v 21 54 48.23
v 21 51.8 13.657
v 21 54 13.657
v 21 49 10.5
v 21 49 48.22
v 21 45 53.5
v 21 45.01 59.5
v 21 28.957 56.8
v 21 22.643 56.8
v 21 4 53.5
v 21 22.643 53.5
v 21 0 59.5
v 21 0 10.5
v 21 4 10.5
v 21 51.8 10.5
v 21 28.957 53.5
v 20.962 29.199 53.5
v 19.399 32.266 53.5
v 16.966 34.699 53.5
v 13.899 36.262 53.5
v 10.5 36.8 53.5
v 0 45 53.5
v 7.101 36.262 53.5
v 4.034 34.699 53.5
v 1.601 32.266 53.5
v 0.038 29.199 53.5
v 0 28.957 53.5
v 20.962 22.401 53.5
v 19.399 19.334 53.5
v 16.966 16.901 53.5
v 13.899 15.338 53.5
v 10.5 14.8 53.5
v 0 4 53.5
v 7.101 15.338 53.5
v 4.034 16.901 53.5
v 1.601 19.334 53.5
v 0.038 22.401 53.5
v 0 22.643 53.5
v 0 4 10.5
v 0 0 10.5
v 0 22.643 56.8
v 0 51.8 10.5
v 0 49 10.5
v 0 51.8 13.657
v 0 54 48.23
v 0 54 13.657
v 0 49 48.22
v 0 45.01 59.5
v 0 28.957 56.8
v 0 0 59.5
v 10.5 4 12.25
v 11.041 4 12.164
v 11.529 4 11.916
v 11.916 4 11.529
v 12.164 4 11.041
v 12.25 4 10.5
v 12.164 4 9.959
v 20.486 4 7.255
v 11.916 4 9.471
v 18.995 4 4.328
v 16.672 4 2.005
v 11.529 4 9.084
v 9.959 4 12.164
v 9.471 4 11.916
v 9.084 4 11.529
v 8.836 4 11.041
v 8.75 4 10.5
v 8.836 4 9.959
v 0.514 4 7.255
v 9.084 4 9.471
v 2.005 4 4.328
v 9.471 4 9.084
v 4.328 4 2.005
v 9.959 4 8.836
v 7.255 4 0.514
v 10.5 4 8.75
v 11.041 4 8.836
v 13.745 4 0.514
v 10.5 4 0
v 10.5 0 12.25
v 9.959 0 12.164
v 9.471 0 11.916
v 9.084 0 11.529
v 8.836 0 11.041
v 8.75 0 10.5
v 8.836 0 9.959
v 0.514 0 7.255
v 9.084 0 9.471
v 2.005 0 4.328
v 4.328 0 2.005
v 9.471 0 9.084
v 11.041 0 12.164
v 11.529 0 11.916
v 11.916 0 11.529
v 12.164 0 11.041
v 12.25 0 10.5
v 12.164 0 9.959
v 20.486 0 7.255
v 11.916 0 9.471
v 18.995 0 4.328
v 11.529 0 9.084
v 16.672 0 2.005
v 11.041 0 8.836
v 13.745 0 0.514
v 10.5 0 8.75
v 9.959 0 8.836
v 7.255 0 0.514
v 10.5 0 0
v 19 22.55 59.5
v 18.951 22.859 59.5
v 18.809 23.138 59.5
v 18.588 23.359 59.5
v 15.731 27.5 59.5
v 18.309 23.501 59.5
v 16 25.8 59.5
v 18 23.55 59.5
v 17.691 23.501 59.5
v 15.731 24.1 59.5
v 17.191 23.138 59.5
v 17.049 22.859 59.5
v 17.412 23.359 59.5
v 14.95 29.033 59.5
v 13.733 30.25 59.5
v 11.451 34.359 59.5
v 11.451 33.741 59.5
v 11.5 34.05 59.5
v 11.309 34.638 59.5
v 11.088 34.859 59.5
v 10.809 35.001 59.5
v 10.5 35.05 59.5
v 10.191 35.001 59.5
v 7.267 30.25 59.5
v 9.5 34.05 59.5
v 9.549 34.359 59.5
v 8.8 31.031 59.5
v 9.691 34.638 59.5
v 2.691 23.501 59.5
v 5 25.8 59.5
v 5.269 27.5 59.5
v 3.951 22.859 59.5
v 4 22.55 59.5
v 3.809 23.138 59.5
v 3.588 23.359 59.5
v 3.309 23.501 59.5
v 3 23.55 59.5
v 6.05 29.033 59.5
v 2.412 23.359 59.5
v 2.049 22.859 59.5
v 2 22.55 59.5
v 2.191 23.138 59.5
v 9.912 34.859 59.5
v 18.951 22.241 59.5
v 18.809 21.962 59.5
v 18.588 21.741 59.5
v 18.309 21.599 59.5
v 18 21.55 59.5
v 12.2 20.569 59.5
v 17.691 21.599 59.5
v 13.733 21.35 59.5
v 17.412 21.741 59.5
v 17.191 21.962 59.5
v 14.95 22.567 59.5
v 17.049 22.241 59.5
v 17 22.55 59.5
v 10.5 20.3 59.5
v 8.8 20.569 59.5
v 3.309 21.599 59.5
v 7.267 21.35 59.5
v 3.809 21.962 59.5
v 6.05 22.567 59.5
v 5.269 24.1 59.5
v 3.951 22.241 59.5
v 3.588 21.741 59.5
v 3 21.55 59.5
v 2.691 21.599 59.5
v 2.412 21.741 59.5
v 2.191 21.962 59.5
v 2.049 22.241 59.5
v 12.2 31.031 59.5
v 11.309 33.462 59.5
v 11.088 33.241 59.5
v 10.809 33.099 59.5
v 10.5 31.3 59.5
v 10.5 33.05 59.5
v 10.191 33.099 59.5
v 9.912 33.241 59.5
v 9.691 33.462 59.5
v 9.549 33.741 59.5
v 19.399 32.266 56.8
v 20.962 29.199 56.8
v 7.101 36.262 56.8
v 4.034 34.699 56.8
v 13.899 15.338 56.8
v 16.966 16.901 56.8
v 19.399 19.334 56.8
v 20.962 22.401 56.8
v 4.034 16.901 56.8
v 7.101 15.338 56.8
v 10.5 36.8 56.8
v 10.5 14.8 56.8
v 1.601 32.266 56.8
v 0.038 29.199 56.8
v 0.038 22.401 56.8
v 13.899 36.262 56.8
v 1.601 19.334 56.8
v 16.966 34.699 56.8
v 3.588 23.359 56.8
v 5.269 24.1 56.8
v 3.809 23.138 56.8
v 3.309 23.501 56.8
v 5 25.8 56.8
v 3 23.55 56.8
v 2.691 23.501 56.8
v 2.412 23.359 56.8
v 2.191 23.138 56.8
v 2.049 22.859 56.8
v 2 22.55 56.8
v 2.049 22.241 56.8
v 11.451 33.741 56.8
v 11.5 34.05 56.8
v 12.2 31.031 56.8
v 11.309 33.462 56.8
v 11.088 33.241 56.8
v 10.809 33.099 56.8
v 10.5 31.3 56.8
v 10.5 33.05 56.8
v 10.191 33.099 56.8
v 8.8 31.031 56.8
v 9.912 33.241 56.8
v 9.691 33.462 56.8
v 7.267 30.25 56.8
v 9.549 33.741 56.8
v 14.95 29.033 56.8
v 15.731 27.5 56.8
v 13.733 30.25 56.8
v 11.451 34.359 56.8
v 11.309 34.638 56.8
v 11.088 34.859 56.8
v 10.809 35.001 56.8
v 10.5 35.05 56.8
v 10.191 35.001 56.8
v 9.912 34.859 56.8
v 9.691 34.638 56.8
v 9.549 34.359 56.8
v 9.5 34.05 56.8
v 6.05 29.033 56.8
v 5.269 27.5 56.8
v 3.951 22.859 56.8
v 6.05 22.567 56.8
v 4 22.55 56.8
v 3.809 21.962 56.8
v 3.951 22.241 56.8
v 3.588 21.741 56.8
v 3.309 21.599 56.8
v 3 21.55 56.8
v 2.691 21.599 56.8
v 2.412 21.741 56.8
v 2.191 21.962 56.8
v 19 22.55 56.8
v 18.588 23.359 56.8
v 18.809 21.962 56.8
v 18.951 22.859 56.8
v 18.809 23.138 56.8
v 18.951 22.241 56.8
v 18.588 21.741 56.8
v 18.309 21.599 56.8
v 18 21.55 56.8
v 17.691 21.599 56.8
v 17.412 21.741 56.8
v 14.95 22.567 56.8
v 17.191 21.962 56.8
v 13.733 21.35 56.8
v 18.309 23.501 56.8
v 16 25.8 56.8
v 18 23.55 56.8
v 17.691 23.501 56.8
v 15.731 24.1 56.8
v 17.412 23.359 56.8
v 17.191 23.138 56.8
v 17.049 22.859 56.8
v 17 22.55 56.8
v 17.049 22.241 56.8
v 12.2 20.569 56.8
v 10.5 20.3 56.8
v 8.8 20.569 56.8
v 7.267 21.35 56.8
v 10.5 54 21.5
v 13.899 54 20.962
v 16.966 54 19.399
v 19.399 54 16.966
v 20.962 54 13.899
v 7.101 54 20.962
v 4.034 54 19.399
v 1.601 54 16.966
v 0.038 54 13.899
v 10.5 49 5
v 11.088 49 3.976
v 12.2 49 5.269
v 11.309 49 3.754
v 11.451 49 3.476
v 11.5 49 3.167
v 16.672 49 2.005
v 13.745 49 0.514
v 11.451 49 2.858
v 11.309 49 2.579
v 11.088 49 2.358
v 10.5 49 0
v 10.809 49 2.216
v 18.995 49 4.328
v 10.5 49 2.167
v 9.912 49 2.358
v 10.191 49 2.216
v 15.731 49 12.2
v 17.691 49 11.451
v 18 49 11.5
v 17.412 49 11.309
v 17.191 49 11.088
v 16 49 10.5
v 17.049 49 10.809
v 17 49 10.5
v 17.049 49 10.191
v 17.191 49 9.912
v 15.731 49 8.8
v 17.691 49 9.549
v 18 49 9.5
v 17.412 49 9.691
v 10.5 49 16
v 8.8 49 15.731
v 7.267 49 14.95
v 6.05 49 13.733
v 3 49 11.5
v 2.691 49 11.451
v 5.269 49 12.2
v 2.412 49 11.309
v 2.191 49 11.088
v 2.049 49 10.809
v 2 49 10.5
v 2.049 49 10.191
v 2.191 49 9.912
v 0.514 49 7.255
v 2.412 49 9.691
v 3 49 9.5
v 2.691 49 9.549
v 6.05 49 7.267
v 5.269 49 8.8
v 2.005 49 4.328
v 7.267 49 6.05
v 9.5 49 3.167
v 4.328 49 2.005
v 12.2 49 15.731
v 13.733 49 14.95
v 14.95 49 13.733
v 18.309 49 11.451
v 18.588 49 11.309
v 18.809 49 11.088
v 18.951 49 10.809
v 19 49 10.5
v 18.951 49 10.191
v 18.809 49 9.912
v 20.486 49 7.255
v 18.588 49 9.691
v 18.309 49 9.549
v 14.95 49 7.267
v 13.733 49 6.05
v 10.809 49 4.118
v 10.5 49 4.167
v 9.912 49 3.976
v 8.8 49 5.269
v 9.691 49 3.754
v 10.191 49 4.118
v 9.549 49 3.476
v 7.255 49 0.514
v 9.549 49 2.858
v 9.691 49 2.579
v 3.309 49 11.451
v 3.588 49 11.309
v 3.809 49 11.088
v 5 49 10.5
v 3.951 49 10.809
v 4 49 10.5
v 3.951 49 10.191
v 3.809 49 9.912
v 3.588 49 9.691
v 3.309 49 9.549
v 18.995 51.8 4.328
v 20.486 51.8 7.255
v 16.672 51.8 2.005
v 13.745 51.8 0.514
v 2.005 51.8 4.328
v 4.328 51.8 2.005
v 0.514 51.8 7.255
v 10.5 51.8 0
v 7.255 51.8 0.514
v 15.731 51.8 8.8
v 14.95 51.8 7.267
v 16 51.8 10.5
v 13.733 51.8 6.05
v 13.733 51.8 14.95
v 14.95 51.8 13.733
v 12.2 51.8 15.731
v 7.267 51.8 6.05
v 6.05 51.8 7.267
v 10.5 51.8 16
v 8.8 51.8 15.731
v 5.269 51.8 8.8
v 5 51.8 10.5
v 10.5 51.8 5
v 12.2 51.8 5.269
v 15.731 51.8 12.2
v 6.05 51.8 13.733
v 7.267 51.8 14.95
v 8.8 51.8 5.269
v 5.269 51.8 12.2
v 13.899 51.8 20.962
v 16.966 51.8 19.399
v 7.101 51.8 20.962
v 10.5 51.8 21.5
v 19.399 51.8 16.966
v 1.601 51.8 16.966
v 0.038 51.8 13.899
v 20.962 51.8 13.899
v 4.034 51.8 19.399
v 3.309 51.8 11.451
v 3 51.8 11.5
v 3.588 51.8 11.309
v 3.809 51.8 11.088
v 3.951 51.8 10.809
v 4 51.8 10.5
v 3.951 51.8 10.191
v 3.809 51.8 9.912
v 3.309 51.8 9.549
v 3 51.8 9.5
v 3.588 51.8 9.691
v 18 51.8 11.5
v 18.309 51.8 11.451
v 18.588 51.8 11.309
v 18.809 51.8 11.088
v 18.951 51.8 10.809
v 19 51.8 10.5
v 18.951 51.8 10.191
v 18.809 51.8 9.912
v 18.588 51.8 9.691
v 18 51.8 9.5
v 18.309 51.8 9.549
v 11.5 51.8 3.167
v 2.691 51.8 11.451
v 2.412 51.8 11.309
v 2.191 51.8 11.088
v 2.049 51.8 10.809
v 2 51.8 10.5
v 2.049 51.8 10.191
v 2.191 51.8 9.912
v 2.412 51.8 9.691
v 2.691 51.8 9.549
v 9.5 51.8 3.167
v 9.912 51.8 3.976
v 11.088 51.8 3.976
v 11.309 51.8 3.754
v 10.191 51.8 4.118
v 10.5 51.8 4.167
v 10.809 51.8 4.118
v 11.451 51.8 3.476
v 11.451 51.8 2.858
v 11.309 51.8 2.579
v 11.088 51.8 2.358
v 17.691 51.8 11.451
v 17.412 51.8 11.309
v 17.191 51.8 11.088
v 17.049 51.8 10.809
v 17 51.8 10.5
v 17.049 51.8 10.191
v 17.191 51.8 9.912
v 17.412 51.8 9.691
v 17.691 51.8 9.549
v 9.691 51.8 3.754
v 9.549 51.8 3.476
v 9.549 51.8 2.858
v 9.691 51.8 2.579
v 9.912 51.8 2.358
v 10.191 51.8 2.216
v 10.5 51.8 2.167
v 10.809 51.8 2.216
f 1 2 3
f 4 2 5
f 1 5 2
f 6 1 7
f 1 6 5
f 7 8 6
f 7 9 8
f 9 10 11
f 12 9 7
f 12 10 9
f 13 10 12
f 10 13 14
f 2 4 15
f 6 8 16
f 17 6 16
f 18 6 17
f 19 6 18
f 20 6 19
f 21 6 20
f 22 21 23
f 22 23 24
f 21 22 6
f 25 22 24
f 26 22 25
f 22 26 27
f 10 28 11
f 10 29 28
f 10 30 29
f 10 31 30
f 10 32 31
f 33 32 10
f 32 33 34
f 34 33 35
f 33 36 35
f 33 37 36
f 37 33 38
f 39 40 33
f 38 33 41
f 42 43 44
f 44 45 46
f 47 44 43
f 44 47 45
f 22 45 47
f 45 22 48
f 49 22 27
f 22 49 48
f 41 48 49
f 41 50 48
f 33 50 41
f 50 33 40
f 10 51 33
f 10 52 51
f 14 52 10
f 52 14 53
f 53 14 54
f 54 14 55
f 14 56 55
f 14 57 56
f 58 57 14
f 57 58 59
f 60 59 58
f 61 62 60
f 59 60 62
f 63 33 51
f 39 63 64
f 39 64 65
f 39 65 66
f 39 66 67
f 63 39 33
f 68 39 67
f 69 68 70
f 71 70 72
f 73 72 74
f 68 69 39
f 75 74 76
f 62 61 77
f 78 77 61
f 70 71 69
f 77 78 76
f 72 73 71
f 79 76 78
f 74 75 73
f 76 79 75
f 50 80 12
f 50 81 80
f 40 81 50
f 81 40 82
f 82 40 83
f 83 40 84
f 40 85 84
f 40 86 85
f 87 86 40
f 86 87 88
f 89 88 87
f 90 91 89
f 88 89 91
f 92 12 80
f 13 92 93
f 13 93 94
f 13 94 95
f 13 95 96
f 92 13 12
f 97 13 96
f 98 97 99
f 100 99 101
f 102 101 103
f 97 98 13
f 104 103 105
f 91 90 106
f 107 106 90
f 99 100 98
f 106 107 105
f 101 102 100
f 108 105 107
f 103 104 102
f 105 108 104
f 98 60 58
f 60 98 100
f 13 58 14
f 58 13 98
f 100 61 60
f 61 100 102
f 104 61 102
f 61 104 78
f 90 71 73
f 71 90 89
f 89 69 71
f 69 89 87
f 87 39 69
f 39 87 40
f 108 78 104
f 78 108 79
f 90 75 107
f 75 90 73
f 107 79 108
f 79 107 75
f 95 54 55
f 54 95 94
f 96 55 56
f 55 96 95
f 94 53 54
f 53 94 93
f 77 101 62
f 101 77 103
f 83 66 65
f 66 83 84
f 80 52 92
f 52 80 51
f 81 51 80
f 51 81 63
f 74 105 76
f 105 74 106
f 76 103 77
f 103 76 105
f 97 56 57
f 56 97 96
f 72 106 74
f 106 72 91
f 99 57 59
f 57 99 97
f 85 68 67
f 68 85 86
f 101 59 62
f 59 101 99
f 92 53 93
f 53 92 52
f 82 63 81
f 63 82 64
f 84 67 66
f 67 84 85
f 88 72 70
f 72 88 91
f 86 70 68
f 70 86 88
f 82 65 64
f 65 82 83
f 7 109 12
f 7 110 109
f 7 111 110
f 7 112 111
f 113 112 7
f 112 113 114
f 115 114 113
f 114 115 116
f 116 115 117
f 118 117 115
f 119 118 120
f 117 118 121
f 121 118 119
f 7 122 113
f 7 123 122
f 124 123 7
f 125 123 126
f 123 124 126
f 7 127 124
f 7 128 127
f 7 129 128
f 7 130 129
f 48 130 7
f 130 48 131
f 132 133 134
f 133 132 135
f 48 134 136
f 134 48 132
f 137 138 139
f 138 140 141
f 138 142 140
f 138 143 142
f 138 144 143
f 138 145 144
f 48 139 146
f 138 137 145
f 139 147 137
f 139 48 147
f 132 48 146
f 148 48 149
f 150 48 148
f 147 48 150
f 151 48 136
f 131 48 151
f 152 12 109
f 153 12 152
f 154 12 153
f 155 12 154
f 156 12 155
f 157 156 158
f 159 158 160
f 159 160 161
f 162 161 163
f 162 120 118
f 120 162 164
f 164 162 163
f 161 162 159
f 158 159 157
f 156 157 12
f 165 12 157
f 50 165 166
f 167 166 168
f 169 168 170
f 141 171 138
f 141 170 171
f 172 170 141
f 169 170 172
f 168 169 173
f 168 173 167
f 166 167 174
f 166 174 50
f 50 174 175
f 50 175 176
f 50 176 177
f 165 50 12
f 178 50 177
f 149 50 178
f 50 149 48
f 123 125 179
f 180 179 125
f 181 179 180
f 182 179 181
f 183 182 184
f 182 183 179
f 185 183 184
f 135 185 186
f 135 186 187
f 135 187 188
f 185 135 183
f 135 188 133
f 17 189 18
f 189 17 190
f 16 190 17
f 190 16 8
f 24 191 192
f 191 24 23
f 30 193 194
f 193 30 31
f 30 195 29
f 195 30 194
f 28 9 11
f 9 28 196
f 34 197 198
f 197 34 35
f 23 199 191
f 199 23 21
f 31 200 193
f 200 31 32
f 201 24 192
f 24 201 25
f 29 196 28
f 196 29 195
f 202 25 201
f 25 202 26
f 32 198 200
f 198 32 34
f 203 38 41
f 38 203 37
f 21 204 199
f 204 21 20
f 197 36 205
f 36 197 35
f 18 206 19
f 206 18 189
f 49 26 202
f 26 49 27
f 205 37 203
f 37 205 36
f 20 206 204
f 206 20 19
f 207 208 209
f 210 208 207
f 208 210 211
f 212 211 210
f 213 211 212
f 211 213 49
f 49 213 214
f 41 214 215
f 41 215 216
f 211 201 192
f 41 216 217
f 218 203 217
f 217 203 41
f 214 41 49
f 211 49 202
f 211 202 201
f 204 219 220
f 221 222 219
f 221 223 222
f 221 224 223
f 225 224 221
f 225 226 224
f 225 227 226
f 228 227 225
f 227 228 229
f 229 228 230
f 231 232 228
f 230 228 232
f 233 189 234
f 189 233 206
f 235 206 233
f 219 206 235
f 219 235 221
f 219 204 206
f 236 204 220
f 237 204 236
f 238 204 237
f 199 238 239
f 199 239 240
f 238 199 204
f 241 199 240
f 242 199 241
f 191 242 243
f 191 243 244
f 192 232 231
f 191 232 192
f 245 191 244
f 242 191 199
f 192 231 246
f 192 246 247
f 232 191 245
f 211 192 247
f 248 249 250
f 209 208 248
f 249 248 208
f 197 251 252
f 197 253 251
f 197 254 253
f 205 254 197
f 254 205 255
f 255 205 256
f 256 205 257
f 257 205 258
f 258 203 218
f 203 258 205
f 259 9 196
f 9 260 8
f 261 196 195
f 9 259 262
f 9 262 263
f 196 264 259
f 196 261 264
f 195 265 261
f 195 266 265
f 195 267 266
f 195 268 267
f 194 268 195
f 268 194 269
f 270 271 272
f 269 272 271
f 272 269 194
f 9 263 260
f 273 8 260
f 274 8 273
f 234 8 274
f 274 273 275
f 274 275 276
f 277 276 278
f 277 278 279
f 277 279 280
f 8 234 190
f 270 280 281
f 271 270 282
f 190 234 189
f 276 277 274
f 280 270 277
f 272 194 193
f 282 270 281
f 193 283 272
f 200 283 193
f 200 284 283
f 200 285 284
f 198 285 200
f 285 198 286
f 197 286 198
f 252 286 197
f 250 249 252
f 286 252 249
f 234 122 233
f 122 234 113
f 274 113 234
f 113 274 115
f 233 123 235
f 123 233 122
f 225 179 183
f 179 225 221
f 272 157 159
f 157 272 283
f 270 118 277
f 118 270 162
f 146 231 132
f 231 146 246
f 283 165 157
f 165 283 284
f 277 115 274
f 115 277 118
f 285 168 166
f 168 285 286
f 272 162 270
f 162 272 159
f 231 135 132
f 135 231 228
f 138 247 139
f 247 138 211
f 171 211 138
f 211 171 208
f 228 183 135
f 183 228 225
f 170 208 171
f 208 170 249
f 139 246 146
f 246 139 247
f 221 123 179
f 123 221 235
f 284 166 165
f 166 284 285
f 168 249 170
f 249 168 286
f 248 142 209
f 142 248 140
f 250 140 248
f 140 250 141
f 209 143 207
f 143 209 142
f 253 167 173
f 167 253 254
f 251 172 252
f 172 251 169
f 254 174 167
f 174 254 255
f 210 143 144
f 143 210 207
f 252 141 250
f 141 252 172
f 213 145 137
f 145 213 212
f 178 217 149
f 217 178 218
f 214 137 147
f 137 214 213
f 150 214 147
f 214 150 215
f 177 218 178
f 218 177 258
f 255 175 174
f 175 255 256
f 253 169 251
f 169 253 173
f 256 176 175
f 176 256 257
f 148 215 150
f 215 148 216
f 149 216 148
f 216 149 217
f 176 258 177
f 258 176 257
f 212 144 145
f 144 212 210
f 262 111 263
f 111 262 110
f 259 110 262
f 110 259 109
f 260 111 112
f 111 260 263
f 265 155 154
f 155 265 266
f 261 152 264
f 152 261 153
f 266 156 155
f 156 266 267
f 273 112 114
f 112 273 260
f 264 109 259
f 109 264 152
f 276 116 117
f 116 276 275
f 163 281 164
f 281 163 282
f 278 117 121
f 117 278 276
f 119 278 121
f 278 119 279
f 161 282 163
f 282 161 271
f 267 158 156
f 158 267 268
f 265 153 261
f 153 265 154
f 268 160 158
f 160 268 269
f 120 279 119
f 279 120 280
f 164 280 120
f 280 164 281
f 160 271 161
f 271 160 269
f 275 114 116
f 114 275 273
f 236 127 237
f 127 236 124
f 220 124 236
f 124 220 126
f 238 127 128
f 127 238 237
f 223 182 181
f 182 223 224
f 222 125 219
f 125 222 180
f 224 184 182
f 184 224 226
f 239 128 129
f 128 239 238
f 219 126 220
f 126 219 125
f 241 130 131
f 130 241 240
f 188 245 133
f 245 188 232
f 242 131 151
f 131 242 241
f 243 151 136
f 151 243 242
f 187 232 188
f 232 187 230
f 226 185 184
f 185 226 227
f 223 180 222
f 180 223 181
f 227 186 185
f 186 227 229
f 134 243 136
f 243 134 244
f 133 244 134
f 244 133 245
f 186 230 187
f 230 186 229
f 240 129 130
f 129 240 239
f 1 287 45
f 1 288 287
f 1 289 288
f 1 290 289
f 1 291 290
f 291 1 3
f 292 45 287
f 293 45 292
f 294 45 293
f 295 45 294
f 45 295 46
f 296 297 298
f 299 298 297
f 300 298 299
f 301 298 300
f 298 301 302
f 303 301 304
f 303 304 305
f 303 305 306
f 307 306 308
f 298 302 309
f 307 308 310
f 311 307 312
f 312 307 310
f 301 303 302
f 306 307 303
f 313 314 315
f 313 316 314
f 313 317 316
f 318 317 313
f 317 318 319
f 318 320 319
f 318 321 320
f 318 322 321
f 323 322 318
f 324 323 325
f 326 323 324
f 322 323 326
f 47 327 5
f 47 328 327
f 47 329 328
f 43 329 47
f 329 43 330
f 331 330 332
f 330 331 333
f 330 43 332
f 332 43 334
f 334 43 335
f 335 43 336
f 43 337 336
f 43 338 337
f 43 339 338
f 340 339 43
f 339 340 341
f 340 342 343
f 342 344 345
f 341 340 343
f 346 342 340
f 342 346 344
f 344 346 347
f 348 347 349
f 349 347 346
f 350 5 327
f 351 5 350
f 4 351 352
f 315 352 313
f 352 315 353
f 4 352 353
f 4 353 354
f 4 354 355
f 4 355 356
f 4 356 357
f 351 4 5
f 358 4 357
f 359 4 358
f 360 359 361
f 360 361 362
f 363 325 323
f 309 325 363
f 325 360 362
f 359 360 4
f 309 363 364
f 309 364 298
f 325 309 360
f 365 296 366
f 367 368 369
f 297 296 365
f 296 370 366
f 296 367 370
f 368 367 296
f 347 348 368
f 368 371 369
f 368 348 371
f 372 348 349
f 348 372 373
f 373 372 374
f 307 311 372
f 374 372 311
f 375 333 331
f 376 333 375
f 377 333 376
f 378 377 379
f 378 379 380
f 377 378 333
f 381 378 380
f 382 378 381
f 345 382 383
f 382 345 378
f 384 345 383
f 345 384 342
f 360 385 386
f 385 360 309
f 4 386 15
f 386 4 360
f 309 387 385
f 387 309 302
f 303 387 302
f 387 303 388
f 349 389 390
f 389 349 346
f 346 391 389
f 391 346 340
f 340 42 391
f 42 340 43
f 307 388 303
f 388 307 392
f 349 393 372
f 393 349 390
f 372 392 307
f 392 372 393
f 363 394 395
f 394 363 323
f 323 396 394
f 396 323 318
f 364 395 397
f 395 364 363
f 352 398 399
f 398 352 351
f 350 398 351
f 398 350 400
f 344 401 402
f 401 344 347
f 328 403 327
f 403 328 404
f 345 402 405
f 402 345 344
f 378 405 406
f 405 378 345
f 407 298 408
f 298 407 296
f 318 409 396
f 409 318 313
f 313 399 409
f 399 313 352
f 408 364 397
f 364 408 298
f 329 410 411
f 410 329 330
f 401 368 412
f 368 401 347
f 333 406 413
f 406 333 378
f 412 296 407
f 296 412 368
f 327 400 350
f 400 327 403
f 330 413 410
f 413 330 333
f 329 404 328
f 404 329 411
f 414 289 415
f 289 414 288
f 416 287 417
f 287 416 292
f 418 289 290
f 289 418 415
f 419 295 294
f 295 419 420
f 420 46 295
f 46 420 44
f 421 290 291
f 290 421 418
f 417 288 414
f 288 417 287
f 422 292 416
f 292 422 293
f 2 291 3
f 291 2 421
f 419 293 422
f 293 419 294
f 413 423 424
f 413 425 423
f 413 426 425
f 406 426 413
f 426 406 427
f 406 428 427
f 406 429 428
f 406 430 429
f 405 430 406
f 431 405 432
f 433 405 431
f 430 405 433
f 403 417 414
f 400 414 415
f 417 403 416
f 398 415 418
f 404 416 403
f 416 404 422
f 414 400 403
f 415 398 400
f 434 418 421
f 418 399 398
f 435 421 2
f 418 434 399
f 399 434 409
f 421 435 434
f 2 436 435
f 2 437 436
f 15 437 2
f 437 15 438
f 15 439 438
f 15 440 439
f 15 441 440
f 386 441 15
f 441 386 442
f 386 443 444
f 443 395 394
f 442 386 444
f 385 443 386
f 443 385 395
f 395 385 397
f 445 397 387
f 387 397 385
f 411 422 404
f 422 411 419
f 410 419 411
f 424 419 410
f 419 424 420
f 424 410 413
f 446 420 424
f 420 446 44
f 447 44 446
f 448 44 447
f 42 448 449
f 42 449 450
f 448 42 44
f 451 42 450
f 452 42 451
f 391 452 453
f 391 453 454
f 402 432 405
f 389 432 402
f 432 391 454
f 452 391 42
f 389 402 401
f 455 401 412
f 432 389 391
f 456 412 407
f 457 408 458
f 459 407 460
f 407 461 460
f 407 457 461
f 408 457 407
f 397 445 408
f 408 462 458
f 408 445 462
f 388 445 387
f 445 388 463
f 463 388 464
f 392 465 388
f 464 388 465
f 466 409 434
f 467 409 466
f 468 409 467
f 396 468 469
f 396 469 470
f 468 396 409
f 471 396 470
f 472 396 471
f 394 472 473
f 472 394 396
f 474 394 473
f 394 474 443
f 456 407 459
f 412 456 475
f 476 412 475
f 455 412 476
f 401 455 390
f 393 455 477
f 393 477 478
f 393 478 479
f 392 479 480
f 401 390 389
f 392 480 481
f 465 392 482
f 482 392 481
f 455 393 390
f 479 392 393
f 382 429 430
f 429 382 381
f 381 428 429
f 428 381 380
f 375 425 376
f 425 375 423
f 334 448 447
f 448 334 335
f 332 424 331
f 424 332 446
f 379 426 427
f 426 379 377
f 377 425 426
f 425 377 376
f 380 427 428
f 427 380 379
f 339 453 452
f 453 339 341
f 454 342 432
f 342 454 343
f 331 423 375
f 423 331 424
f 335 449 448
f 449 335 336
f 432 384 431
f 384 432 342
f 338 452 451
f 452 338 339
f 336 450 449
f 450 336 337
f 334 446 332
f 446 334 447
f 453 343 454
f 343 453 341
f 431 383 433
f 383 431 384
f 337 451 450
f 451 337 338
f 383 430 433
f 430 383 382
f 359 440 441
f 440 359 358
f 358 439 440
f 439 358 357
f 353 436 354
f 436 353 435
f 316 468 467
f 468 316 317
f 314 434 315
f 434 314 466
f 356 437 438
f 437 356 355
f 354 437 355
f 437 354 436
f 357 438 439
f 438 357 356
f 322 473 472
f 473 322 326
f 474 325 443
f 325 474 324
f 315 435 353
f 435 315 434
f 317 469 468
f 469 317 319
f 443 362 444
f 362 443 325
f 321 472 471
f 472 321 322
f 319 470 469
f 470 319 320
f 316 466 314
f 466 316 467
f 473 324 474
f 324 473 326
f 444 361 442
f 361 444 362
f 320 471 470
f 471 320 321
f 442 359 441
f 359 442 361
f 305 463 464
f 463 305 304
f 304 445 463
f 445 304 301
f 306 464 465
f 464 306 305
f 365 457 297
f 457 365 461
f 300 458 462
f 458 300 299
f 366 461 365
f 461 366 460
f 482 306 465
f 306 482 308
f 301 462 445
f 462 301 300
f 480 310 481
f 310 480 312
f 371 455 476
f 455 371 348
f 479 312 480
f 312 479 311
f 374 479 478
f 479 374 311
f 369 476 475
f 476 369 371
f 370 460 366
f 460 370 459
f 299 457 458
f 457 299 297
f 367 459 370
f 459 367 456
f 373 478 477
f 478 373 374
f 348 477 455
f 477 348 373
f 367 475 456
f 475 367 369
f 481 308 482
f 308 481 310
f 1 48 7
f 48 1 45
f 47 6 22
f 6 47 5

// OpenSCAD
//leg

//variables
xUpper = 21;
yUpper = 45;
zUpper = 6;

upperBigHoleD = 22;
upperBigHoleH = 3.3;

upperMediumHoleD = 11;
upperSmallHoleD = 2;

xLeftSide = 21;
yLeftSide = 4;
zLeftSide = 43;

xRightSide = 21;
yRightSide = 5;
zRightSide = 37.72;

leftSideHoleD = 3.5;
cornerLeftD = xLeftSide;

//modules
module leg(){
    union(){
        leftPart();
        thingsToHull();
        upperPart();
        rightPart();
    }
}

module thingsToHull(){
    hull(){
    translate([0,yUpper,zLeftSide+cornerLeftD/2])
        cube([xUpper, 0.01, zUpper]);
    translate([0,yUpper+9-yRightSide,cornerLeftD/2+zRightSide])
        cube([xRightSide, yRightSide, 0.01]);
    }
}

module upperPart(){
    difference(){
        //Parte plana superior
        translate([0,0,zLeftSide+cornerLeftD/2])
            cube([xUpper, yUpper, zUpper]);
        //circulo grande
        translate([xUpper/2, 10.8+yLeftSide+upperBigHoleD/2,zLeftSide+cornerLeftD/2+upperBigHoleH/2])
            cylinder(h=upperBigHoleH, d=upperBigHoleD, center=true, $fn=20);
        //circulo mediano
        translate([xUpper/2, 10.8+yLeftSide+upperBigHoleD/2,zLeftSide+cornerLeftD/2+zUpper/2])
            cylinder(h=zUpper, d=upperMediumHoleD, center=true, $fn=20);
        
        //circulos pequeños
        translate([3, 10.8+yLeftSide+upperBigHoleD/2-3.25,zLeftSide+cornerLeftD/2+zUpper/2])
            cylinder(h=zUpper, d=upperSmallHoleD, center=true, $fn=20);
        translate([xUpper-3, 10.8+yLeftSide+upperBigHoleD/2-3.25,zLeftSide+cornerLeftD/2+zUpper/2])
            cylinder(h=zUpper, d=upperSmallHoleD, center=true, $fn=20);
        translate([xUpper/2, 10.8+yLeftSide+upperBigHoleD/2+upperMediumHoleD/2+(upperBigHoleD-upperMediumHoleD)/4,zLeftSide+cornerLeftD/2+zUpper/2])
            cylinder(h=zUpper, d=upperSmallHoleD, center=true, $fn=20);
    }    
}

module leftPart(){
    difference(){
        leftPartWithoutHole();
        translate([cornerLeftD/2,yLeftSide/2,cornerLeftD/2])
            rotate([90,0,0])
                cylinder(h=yLeftSide+1, d=leftSideHoleD, center=true, $fn=20);
    }
}

module leftPartWithoutHole(){
    union(){
        translate([0,0, cornerLeftD/2])
            cube([xLeftSide, yLeftSide, zLeftSide]);
        translate([cornerLeftD/2,0,cornerLeftD/2])
            rotate([270,0,0])
                cylinder(h=yLeftSide, d=cornerLeftD, $fn=20);
    }    
}

module rightPart(){
    difference(){
        union(){
            translate([0,yUpper+9-yRightSide,cornerLeftD/2])
                cube([xRightSide, yRightSide, zRightSide]);
            translate([cornerLeftD/2,yUpper+9-yRightSide,cornerLeftD/2])
                rotate([270,0,0])
                    cylinder(h=yRightSide, d=cornerLeftD, $fn=20);
        }
        translate([cornerLeftD/2,yUpper+9-yRightSide,cornerLeftD/2])
                rotate([270,0,0])
                    cylinder(h=yRightSide, d=upperMediumHoleD, $fn=20);
        translate([cornerLeftD/2,yUpper+9-yRightSide+2.8,cornerLeftD/2])
                rotate([270,0,0])
                    cylinder(h=yRightSide, d=upperBigHoleD, $fn=20);
        
        //circulos pequeños
        translate([3, yUpper+9-yRightSide+yRightSide/2+2.8-3.25,cornerLeftD/2])
            rotate([270,0,0])
                cylinder(h=zUpper, d=upperSmallHoleD, center=true, $fn=20);
        translate([xRightSide-3, yUpper-yRightSide+yRightSide/2+9+2.8-3.25,cornerLeftD/2])
            rotate([270,0,0])
                cylinder(h=zUpper, d=upperSmallHoleD, center=true, $fn=20);
        translate([xUpper/2, yUpper-yRightSide+yRightSide/2+9+2.8-3.25,cornerLeftD/2-(upperBigHoleD-upperMediumHoleD)/1.5])
            rotate([270,0,0])
                cylinder(h=zUpper, d=upperSmallHoleD, center=true, $fn=20);
    }    
}

//invocation
leg();
